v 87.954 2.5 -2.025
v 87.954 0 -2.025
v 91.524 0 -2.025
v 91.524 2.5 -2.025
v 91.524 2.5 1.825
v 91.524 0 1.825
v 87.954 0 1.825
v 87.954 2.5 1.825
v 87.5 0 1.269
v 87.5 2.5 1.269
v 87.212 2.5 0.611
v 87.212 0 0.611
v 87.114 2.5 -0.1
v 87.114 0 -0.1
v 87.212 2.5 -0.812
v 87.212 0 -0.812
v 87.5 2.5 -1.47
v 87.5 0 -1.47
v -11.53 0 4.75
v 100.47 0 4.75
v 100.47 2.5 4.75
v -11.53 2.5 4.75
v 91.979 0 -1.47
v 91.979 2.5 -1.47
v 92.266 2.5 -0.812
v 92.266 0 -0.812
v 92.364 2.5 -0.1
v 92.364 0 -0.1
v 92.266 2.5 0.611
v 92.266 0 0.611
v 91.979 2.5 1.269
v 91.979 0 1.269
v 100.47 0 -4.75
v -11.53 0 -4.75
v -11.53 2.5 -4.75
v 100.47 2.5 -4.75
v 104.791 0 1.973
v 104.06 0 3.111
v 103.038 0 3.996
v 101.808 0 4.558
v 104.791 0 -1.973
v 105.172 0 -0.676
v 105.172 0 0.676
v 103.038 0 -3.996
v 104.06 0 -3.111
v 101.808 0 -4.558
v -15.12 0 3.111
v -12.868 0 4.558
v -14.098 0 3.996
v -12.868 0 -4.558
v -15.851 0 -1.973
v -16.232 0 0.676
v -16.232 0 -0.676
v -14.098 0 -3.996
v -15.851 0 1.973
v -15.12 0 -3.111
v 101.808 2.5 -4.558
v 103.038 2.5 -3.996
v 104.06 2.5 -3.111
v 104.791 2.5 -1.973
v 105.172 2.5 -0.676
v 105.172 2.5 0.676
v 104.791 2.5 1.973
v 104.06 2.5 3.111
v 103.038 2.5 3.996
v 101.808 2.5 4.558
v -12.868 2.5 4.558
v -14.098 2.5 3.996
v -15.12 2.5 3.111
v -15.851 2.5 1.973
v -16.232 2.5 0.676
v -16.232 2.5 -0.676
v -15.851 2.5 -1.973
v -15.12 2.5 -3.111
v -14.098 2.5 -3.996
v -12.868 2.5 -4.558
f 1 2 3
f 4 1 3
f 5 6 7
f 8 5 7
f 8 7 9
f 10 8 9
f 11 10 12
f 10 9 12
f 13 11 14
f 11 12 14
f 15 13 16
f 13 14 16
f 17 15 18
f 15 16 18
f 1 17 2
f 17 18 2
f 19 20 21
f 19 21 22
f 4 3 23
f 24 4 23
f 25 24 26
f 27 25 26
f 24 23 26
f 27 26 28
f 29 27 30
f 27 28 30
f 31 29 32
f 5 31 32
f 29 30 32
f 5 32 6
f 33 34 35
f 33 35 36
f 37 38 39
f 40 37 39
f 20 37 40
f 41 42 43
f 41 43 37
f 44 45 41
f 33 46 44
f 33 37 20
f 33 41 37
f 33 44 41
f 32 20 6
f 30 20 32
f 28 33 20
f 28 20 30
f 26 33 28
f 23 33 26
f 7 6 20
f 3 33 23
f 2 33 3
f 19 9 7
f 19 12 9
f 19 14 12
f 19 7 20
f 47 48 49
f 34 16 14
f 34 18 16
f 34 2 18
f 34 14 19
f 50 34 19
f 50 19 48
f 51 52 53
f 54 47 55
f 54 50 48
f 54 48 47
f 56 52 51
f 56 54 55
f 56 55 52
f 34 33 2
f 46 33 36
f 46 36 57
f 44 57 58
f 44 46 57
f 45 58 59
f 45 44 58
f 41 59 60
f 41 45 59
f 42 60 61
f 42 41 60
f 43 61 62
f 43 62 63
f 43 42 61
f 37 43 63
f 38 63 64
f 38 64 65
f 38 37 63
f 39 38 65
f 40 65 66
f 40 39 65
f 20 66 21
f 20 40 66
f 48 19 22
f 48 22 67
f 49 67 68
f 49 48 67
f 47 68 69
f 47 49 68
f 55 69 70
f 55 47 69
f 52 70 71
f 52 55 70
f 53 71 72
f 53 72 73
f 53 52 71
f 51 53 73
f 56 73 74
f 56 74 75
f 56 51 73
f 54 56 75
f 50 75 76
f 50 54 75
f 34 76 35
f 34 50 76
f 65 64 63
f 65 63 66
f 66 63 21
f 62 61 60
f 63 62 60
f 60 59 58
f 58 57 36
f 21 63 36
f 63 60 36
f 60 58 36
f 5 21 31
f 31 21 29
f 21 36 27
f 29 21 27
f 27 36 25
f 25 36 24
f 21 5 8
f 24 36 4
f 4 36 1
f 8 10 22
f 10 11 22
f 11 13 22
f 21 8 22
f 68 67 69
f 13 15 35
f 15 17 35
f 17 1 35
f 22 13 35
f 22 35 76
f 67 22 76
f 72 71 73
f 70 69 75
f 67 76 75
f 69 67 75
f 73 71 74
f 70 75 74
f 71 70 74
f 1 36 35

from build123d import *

# Parameters (mm, degrees)
BOSS_EXTRUDE1_DEPTH     = 2.5
CUT_EXTRUDE1_DEPTH      = 106.356743667
CUT_EXTRUDE1_DEPTH_BACK = 106.356743667


with BuildPart() as part:
    # Sketch1 → Boss-Extrude1 (new body)
    with BuildSketch(Plane(origin=(0, 0, 0), x_dir=(1, 0, 0), z_dir=(0, 1, 0))):
        with BuildLine():
            Line((-11.530082988, 4.75), (100.469917012, 4.75))
            ThreePointArc((100.469917012, 4.75), (105.219917012, 0), (100.469917012, -4.75))
            Line((100.469917012, -4.75), (-11.530082988, -4.75))
            ThreePointArc((-11.530082988, -4.75), (-16.280082988, 0), (-11.530082988, 4.75))
        make_face()
    extrude(amount=BOSS_EXTRUDE1_DEPTH)

    # Sketch2 → Cut-Extrude1 (cut, two sides: drawn at the far end of the back side and taken through both)
    with BuildSketch(Plane(origin=(0, 2.5, 0), x_dir=(1, 0, 0), z_dir=(0, 1, 0)).offset(-CUT_EXTRUDE1_DEPTH_BACK)):
        with BuildLine():
            Line((87.954451806, 2.025316283), (91.523765465, 2.025316283))
            ThreePointArc((91.523765465, 2.025316283), (92.364108635, 0.100316283), (91.523765465, -1.824683717))
            Line((91.523765465, -1.824683717), (87.954451806, -1.824683717))
            ThreePointArc((87.954451806, -1.824683717), (87.114108635, 0.100316283), (87.954451806, 2.025316283))
        make_face()
    extrude(amount=CUT_EXTRUDE1_DEPTH + CUT_EXTRUDE1_DEPTH_BACK, mode=Mode.SUBTRACT)


solid = part.part
